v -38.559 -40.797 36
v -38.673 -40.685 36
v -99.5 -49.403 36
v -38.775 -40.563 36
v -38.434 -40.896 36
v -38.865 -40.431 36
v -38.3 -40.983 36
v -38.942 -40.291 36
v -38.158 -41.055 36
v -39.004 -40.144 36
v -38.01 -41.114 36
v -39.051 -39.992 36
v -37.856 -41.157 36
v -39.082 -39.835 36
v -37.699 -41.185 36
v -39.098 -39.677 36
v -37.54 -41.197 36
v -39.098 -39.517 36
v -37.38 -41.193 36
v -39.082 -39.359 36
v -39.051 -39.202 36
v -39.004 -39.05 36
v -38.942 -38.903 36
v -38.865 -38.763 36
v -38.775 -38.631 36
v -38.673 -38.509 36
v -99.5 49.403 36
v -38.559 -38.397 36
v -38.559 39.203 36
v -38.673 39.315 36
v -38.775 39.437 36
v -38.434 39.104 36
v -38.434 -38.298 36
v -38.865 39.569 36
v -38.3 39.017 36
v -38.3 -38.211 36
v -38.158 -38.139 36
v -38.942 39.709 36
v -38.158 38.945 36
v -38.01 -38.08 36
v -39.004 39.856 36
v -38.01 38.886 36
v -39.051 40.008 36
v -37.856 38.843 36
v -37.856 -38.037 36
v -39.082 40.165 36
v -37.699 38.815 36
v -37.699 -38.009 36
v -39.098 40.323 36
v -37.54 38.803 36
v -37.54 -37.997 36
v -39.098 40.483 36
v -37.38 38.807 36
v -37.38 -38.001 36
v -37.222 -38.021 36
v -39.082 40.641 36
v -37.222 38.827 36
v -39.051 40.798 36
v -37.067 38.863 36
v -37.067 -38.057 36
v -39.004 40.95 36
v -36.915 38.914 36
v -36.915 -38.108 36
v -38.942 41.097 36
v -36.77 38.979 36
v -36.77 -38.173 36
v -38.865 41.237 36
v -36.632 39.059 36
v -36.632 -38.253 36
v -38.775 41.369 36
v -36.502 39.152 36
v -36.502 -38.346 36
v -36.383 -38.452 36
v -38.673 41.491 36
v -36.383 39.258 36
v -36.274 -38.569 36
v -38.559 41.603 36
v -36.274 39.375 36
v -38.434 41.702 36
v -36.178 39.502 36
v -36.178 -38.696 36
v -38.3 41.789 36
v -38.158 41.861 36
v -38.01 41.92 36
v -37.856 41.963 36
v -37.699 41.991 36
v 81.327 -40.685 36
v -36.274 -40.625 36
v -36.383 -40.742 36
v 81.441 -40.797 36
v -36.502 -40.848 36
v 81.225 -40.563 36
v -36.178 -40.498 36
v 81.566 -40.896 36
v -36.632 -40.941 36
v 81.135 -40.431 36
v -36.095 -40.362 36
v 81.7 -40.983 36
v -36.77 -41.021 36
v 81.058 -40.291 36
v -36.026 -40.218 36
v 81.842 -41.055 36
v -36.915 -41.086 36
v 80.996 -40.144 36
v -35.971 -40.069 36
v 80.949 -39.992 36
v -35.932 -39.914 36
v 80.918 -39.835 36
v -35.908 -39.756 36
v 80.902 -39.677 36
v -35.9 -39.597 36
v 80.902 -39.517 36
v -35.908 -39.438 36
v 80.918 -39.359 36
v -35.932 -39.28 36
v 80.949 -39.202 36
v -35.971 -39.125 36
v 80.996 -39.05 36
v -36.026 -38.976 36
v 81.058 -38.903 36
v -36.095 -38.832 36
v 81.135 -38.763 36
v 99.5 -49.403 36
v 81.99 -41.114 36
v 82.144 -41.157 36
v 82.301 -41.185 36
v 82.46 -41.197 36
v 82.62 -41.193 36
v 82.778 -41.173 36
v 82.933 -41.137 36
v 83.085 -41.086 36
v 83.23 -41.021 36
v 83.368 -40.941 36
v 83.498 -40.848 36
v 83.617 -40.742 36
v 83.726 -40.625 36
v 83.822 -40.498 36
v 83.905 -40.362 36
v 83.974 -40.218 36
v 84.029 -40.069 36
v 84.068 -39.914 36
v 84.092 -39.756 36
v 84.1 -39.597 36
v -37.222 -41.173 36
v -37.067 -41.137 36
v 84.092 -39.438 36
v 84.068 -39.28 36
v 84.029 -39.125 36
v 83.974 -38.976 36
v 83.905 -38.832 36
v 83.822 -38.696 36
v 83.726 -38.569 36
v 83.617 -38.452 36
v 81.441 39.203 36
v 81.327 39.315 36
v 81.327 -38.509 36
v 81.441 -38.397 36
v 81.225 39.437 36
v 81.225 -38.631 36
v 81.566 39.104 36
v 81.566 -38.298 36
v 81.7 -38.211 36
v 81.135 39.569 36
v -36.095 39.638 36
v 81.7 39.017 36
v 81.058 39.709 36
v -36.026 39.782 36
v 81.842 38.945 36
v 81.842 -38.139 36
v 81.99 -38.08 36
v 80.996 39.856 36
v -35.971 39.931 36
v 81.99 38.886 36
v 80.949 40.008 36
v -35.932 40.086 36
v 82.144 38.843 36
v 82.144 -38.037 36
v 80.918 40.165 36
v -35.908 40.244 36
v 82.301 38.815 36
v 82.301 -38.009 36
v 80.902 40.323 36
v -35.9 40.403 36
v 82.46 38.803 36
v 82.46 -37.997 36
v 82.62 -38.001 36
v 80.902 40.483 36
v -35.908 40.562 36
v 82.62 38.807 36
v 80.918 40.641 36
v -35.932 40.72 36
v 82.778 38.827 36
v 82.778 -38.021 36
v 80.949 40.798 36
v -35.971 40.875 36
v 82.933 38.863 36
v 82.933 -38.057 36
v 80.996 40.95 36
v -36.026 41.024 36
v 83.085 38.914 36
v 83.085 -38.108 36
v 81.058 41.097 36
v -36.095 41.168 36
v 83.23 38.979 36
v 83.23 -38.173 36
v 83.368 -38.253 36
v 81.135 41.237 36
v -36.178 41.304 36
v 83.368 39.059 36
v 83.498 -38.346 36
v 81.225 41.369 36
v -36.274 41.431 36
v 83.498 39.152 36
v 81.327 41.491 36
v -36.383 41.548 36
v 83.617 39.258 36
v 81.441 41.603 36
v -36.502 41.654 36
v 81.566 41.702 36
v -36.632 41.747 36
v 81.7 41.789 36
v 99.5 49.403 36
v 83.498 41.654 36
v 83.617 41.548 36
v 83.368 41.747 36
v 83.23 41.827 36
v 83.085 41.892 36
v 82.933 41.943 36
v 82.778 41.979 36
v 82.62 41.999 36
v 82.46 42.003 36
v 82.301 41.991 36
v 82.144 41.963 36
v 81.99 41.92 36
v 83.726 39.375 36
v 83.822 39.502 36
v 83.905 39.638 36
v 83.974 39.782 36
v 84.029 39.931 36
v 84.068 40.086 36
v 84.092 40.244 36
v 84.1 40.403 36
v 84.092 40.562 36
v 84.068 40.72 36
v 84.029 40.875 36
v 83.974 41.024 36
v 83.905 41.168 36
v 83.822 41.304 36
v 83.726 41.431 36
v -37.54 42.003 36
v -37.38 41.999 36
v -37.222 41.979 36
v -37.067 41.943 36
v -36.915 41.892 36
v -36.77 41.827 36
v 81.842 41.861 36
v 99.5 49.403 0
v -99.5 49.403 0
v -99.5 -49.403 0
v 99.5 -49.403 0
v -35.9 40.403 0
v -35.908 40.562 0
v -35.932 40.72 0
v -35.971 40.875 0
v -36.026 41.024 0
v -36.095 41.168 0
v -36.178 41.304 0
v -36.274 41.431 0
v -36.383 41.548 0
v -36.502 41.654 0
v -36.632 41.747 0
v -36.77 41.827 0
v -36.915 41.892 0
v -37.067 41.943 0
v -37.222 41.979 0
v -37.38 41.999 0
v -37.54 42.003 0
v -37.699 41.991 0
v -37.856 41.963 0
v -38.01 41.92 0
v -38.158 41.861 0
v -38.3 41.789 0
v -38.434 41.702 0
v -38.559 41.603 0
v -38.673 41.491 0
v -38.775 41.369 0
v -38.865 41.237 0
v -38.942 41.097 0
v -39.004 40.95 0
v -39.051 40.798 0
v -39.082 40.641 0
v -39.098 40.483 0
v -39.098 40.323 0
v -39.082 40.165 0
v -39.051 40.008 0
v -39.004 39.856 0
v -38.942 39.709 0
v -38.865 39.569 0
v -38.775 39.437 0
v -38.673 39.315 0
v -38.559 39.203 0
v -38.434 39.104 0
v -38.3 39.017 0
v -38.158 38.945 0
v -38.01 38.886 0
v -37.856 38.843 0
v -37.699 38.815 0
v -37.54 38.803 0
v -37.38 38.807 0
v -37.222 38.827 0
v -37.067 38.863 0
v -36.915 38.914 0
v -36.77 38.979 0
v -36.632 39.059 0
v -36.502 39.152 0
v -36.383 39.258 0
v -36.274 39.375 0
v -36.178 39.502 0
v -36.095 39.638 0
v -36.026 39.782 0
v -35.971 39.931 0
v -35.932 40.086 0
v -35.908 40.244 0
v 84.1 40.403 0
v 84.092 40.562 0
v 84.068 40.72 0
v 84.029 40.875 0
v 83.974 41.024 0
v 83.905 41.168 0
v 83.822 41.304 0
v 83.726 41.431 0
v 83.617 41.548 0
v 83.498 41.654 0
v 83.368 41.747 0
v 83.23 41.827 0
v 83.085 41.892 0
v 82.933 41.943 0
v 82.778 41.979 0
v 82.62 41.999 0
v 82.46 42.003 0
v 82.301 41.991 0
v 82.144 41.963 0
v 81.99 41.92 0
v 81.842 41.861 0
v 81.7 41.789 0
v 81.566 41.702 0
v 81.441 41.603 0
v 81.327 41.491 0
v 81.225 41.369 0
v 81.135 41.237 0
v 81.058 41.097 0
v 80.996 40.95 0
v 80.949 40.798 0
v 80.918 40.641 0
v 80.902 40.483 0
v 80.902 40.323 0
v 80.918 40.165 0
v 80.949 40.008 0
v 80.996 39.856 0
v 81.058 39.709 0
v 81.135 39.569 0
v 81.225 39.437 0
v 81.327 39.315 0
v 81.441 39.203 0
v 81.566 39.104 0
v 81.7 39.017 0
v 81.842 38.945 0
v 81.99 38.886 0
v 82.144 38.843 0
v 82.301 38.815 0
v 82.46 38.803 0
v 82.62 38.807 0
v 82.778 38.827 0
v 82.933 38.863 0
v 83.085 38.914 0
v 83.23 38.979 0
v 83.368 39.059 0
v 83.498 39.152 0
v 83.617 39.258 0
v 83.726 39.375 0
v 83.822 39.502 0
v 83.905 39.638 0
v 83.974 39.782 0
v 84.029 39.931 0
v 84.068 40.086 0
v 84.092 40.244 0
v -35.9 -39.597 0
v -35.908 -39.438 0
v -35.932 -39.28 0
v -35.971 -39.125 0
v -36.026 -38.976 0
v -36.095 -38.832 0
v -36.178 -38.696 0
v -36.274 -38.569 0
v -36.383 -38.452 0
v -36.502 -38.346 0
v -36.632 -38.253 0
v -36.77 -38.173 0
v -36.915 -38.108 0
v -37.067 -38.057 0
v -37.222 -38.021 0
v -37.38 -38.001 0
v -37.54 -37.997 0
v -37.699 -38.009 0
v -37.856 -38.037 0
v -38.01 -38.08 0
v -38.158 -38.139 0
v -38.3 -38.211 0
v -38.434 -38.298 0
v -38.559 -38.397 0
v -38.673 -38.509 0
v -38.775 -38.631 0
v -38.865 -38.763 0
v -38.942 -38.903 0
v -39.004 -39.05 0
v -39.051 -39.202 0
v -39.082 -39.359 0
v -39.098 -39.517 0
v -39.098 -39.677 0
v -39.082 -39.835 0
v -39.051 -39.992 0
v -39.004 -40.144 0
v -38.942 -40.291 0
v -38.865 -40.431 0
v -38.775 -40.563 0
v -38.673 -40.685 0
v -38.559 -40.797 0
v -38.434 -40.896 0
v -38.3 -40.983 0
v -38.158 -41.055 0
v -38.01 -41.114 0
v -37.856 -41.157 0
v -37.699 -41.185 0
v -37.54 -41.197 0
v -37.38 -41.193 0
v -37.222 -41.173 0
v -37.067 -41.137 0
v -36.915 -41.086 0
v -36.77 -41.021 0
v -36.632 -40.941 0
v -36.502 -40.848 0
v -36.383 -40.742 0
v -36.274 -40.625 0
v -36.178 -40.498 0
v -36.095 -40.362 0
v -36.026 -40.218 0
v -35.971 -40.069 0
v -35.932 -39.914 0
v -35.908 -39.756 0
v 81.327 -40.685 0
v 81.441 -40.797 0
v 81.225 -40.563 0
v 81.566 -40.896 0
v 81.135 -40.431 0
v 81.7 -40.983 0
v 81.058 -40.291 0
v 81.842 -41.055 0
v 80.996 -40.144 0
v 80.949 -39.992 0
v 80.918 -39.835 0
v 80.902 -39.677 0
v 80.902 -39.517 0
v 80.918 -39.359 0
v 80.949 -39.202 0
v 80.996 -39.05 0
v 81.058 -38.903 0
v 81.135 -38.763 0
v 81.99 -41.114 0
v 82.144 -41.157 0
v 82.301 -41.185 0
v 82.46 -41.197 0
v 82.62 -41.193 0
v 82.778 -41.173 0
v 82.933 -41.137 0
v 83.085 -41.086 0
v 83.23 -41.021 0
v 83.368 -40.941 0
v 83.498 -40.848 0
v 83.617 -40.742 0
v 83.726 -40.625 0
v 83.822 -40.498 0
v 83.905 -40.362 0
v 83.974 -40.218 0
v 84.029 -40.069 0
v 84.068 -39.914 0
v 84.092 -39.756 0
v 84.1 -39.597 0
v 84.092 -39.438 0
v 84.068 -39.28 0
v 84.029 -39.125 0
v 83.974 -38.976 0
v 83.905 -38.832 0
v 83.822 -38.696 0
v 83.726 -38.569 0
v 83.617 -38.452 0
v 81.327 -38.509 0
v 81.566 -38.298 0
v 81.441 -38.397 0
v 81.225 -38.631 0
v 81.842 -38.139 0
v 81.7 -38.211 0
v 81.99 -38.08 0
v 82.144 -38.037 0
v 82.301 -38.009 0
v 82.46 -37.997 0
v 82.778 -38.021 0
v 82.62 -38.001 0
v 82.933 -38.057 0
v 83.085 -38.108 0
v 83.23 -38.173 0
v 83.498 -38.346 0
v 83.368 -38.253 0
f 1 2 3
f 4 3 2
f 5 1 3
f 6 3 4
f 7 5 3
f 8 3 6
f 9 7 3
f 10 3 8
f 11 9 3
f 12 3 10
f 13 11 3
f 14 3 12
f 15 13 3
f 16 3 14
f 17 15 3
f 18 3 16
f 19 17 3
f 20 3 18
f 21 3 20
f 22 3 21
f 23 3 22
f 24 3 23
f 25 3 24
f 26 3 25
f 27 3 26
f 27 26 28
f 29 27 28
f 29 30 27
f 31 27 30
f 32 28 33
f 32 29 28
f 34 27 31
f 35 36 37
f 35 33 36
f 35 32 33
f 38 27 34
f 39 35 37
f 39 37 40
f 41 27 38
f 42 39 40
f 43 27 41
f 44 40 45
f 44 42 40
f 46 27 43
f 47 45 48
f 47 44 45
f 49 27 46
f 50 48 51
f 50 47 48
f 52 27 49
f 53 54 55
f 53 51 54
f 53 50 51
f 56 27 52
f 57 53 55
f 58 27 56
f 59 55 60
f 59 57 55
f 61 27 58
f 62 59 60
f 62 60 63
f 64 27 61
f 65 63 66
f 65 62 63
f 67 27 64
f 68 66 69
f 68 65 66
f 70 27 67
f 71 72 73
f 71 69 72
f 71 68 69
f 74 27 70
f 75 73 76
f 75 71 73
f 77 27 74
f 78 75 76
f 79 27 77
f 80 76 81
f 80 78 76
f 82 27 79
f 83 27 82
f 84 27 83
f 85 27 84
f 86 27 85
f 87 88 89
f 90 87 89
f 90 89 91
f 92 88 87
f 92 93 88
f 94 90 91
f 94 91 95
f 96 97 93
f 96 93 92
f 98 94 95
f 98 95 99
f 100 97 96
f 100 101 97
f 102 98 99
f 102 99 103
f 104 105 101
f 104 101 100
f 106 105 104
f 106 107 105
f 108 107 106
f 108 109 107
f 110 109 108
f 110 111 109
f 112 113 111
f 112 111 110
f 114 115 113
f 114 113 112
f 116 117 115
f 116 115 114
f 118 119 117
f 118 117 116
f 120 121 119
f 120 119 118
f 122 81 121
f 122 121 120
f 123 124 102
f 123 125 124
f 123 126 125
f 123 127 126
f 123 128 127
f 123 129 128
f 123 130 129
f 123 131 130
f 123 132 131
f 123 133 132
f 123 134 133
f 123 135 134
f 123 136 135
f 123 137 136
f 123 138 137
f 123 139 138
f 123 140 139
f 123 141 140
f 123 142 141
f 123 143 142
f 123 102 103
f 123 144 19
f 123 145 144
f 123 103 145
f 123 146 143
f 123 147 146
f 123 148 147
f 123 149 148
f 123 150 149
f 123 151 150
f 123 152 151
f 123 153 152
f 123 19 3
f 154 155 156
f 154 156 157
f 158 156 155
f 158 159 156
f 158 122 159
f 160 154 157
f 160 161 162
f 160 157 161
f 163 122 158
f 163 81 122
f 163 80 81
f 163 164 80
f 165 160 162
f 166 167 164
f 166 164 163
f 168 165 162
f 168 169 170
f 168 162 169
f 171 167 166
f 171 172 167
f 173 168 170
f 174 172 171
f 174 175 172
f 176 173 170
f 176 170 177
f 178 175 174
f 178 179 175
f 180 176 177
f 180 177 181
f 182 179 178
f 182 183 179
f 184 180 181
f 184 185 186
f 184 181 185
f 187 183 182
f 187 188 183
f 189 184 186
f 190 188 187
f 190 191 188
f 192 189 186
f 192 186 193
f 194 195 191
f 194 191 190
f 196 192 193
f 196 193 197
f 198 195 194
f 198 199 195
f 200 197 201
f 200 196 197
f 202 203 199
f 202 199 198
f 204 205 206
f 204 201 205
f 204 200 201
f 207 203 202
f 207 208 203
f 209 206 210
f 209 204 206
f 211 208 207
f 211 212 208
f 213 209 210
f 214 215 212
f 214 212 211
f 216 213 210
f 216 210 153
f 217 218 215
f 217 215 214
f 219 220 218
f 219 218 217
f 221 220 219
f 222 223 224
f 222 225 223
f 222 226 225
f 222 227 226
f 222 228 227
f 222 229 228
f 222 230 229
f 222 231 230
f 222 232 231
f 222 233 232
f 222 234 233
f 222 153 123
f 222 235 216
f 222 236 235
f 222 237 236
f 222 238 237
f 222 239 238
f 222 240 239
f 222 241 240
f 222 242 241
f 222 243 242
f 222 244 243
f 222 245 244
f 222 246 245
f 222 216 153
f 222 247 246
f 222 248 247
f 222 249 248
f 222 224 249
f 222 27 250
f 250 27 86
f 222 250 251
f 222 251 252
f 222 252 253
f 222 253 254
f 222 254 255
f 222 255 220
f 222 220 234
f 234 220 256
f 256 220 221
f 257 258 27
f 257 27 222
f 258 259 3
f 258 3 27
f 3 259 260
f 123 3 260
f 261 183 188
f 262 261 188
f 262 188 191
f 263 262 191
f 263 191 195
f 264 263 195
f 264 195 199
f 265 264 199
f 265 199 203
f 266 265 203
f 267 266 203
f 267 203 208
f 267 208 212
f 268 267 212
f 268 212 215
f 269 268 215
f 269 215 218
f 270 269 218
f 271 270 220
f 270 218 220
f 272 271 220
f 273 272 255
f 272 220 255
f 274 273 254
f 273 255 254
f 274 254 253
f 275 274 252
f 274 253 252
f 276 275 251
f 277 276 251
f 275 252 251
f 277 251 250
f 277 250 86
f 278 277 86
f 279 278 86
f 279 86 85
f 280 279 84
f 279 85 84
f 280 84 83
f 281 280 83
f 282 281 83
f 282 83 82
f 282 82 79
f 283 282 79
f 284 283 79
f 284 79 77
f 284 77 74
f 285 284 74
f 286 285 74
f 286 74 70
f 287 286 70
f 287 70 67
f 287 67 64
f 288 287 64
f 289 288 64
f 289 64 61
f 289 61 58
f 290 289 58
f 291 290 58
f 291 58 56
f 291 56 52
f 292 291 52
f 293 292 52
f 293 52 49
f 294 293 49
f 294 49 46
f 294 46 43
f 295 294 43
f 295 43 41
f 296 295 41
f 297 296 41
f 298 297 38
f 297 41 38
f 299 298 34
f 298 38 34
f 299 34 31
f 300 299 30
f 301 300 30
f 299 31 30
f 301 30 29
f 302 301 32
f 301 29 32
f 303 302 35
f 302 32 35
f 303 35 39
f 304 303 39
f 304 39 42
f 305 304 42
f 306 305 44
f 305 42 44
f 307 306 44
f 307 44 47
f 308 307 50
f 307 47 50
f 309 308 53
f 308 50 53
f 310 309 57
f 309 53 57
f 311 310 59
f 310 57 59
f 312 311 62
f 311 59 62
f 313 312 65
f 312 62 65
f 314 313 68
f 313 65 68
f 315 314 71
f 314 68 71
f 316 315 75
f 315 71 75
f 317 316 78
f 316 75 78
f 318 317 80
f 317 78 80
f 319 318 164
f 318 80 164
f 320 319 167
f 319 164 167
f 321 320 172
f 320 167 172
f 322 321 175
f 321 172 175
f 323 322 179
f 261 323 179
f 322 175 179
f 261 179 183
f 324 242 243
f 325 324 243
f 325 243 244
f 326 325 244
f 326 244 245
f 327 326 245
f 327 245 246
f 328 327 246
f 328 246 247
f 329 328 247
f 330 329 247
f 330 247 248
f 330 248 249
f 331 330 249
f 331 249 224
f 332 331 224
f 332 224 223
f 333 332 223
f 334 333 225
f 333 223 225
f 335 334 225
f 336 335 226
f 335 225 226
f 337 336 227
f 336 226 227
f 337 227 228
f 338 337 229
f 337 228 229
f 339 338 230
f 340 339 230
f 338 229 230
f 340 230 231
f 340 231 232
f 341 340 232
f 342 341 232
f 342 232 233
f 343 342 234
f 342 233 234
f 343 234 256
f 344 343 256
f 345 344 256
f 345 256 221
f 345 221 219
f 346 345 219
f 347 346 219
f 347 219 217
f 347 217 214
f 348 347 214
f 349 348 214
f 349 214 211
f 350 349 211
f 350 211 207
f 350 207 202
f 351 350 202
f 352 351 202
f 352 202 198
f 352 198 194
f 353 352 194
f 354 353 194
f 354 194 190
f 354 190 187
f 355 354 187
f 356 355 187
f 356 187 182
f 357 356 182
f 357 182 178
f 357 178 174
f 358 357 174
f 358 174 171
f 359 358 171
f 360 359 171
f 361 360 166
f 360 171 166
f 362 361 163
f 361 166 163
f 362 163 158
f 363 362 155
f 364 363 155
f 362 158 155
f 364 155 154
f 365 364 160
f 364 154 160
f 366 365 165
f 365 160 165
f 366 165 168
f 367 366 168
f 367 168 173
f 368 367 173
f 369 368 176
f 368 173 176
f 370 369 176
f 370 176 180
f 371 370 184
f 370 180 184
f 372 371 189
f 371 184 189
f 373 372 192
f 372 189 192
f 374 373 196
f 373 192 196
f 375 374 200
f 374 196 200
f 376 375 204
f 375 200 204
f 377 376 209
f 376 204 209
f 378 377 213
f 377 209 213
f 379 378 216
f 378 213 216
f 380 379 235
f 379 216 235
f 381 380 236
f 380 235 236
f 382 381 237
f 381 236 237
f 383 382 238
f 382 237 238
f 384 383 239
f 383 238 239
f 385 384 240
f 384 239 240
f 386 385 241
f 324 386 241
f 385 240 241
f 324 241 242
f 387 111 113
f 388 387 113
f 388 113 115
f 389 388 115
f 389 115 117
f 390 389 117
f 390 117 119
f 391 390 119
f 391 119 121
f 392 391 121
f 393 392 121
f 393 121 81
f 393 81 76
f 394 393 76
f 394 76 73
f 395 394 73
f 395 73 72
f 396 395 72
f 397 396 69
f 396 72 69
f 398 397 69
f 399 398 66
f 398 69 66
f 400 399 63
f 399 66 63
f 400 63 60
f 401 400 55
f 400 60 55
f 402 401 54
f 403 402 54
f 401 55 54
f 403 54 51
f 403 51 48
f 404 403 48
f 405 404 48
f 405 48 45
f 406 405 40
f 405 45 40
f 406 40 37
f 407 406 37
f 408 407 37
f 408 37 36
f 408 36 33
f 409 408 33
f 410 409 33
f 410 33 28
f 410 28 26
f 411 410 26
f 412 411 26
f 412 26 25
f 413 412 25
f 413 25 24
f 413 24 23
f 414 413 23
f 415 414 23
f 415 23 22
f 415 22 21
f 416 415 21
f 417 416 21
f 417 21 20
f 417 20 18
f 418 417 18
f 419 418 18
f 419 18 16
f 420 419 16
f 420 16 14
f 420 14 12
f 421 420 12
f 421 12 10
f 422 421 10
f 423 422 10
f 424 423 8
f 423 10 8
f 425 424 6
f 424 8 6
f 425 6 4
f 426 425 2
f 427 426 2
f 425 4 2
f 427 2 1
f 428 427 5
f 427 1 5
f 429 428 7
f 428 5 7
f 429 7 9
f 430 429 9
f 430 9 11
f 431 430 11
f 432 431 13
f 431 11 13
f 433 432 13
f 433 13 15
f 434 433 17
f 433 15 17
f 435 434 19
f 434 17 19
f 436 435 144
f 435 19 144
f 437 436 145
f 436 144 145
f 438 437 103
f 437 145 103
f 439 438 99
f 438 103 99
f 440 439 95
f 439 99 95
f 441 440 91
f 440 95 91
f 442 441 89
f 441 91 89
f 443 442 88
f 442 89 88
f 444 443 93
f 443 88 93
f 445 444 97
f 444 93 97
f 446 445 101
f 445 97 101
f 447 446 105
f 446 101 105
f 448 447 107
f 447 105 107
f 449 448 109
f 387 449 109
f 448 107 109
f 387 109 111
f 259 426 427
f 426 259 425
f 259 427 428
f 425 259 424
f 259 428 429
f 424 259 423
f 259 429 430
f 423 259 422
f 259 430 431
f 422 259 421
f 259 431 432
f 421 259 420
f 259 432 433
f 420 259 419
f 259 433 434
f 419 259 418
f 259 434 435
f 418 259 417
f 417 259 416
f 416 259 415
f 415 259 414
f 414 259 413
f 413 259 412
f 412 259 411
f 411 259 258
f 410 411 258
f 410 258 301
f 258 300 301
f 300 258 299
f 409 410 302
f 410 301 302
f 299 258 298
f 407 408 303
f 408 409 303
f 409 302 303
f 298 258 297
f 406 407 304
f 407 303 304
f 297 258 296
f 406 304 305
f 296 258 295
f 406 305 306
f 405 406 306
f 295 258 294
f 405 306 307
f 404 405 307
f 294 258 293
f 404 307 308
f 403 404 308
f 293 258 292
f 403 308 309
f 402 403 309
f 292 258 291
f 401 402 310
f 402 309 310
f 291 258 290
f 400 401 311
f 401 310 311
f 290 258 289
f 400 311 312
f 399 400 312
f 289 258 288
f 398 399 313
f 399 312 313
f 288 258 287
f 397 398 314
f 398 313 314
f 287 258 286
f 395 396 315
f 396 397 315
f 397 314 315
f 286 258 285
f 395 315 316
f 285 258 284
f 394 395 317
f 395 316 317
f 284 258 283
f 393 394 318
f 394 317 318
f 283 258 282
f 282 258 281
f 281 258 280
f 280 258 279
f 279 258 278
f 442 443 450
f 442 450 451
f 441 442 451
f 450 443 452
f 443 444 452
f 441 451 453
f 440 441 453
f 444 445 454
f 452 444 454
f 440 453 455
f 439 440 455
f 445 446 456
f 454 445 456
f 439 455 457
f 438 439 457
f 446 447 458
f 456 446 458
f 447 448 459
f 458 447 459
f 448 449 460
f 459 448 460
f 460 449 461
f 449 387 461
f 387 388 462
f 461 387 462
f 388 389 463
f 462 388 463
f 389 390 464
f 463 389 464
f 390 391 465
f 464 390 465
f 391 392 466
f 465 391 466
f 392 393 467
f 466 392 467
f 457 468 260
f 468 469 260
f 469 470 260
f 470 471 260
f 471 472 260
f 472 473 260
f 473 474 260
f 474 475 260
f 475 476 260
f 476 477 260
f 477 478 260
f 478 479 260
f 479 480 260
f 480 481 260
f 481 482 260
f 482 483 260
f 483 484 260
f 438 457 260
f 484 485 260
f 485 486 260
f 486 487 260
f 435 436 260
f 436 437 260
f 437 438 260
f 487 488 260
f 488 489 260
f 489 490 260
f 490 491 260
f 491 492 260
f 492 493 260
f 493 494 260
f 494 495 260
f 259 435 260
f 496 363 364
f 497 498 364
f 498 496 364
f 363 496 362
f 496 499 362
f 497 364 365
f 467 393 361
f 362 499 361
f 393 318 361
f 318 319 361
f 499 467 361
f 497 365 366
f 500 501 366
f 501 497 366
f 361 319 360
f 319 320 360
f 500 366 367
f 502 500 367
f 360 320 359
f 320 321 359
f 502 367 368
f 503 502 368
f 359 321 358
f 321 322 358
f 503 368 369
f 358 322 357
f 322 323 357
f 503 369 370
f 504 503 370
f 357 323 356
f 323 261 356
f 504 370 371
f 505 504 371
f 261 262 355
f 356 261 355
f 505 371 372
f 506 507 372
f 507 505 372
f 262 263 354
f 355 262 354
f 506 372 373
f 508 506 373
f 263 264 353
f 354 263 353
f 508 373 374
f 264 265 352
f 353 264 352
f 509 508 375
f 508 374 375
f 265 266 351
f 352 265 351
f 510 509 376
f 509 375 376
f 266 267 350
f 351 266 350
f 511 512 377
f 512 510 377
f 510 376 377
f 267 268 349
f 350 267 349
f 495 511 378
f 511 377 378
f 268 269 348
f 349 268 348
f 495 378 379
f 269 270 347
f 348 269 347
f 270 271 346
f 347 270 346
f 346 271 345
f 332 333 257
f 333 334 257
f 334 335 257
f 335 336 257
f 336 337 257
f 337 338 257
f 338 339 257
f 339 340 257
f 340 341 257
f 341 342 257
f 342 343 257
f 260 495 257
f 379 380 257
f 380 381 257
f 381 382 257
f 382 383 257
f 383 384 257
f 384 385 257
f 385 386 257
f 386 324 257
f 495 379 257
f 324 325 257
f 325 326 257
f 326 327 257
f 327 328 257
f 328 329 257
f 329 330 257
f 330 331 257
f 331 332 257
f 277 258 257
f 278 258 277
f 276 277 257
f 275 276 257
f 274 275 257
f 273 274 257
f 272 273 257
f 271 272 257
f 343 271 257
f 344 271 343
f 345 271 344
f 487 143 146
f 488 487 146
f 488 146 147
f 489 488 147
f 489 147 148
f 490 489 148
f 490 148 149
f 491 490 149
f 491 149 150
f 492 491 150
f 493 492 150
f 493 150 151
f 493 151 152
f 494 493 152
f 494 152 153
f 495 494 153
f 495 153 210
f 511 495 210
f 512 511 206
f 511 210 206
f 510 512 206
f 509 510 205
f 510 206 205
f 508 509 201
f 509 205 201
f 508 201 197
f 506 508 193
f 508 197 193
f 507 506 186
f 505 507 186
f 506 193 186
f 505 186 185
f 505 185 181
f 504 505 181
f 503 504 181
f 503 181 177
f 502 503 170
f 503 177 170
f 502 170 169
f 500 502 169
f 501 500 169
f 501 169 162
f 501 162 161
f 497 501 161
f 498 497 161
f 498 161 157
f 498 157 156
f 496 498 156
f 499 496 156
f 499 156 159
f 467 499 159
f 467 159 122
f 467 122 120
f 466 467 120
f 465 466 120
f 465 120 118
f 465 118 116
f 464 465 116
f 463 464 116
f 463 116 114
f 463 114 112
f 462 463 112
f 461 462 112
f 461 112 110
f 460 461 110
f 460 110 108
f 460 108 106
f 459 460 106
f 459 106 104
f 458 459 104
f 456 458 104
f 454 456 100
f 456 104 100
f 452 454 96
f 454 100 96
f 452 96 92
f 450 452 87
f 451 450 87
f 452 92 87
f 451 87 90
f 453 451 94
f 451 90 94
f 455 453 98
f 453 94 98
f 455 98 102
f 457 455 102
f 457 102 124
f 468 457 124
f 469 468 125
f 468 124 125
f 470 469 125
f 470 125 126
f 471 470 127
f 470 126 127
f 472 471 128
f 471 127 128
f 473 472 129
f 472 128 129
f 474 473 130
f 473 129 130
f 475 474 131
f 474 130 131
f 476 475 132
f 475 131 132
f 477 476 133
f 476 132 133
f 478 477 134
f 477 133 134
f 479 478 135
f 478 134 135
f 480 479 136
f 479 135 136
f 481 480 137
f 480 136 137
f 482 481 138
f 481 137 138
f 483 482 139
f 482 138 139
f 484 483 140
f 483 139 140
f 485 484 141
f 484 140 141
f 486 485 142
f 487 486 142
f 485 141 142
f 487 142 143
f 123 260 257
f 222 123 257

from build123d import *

# Parameters (mm, degrees)
SKETCH1_W            = 199
SKETCH1_H            = 98.806
BOSS_EXTRUDE1_DEPTH  = 36
SKETCH2_R            = 1.6
CUT_EXTRUDE1_DEPTH   = 37
LPATTERN1_COUNT      = 2
LPATTERN1_PITCH      = 120
LPATTERN1_COUNT_DIR2 = 2
LPATTERN1_PITCH_DIR2 = 80


with BuildPart() as part:
    # Sketch1 → Boss-Extrude1 (new body)
    with BuildSketch(Plane.XY):
        Rectangle(SKETCH1_W, SKETCH1_H)
    extrude(amount=BOSS_EXTRUDE1_DEPTH)

    # Sketch2 → Cut-Extrude1 (cut, through all)
    with BuildSketch(Plane.XY.offset(36)):
        with Locations((-37.5, 40.403)):
            Circle(SKETCH2_R)
    cut_extrude1 = extrude(amount=-CUT_EXTRUDE1_DEPTH, mode=Mode.SUBTRACT)

    # LPattern1: Cut-Extrude1 2 × 2
    with Locations(*[(i * LPATTERN1_PITCH, -j * LPATTERN1_PITCH_DIR2, 0) for i in range(LPATTERN1_COUNT) for j in range(LPATTERN1_COUNT_DIR2) if (i, j) != (0, 0)]):
        add(cut_extrude1, mode=Mode.SUBTRACT)


solid = part.part
